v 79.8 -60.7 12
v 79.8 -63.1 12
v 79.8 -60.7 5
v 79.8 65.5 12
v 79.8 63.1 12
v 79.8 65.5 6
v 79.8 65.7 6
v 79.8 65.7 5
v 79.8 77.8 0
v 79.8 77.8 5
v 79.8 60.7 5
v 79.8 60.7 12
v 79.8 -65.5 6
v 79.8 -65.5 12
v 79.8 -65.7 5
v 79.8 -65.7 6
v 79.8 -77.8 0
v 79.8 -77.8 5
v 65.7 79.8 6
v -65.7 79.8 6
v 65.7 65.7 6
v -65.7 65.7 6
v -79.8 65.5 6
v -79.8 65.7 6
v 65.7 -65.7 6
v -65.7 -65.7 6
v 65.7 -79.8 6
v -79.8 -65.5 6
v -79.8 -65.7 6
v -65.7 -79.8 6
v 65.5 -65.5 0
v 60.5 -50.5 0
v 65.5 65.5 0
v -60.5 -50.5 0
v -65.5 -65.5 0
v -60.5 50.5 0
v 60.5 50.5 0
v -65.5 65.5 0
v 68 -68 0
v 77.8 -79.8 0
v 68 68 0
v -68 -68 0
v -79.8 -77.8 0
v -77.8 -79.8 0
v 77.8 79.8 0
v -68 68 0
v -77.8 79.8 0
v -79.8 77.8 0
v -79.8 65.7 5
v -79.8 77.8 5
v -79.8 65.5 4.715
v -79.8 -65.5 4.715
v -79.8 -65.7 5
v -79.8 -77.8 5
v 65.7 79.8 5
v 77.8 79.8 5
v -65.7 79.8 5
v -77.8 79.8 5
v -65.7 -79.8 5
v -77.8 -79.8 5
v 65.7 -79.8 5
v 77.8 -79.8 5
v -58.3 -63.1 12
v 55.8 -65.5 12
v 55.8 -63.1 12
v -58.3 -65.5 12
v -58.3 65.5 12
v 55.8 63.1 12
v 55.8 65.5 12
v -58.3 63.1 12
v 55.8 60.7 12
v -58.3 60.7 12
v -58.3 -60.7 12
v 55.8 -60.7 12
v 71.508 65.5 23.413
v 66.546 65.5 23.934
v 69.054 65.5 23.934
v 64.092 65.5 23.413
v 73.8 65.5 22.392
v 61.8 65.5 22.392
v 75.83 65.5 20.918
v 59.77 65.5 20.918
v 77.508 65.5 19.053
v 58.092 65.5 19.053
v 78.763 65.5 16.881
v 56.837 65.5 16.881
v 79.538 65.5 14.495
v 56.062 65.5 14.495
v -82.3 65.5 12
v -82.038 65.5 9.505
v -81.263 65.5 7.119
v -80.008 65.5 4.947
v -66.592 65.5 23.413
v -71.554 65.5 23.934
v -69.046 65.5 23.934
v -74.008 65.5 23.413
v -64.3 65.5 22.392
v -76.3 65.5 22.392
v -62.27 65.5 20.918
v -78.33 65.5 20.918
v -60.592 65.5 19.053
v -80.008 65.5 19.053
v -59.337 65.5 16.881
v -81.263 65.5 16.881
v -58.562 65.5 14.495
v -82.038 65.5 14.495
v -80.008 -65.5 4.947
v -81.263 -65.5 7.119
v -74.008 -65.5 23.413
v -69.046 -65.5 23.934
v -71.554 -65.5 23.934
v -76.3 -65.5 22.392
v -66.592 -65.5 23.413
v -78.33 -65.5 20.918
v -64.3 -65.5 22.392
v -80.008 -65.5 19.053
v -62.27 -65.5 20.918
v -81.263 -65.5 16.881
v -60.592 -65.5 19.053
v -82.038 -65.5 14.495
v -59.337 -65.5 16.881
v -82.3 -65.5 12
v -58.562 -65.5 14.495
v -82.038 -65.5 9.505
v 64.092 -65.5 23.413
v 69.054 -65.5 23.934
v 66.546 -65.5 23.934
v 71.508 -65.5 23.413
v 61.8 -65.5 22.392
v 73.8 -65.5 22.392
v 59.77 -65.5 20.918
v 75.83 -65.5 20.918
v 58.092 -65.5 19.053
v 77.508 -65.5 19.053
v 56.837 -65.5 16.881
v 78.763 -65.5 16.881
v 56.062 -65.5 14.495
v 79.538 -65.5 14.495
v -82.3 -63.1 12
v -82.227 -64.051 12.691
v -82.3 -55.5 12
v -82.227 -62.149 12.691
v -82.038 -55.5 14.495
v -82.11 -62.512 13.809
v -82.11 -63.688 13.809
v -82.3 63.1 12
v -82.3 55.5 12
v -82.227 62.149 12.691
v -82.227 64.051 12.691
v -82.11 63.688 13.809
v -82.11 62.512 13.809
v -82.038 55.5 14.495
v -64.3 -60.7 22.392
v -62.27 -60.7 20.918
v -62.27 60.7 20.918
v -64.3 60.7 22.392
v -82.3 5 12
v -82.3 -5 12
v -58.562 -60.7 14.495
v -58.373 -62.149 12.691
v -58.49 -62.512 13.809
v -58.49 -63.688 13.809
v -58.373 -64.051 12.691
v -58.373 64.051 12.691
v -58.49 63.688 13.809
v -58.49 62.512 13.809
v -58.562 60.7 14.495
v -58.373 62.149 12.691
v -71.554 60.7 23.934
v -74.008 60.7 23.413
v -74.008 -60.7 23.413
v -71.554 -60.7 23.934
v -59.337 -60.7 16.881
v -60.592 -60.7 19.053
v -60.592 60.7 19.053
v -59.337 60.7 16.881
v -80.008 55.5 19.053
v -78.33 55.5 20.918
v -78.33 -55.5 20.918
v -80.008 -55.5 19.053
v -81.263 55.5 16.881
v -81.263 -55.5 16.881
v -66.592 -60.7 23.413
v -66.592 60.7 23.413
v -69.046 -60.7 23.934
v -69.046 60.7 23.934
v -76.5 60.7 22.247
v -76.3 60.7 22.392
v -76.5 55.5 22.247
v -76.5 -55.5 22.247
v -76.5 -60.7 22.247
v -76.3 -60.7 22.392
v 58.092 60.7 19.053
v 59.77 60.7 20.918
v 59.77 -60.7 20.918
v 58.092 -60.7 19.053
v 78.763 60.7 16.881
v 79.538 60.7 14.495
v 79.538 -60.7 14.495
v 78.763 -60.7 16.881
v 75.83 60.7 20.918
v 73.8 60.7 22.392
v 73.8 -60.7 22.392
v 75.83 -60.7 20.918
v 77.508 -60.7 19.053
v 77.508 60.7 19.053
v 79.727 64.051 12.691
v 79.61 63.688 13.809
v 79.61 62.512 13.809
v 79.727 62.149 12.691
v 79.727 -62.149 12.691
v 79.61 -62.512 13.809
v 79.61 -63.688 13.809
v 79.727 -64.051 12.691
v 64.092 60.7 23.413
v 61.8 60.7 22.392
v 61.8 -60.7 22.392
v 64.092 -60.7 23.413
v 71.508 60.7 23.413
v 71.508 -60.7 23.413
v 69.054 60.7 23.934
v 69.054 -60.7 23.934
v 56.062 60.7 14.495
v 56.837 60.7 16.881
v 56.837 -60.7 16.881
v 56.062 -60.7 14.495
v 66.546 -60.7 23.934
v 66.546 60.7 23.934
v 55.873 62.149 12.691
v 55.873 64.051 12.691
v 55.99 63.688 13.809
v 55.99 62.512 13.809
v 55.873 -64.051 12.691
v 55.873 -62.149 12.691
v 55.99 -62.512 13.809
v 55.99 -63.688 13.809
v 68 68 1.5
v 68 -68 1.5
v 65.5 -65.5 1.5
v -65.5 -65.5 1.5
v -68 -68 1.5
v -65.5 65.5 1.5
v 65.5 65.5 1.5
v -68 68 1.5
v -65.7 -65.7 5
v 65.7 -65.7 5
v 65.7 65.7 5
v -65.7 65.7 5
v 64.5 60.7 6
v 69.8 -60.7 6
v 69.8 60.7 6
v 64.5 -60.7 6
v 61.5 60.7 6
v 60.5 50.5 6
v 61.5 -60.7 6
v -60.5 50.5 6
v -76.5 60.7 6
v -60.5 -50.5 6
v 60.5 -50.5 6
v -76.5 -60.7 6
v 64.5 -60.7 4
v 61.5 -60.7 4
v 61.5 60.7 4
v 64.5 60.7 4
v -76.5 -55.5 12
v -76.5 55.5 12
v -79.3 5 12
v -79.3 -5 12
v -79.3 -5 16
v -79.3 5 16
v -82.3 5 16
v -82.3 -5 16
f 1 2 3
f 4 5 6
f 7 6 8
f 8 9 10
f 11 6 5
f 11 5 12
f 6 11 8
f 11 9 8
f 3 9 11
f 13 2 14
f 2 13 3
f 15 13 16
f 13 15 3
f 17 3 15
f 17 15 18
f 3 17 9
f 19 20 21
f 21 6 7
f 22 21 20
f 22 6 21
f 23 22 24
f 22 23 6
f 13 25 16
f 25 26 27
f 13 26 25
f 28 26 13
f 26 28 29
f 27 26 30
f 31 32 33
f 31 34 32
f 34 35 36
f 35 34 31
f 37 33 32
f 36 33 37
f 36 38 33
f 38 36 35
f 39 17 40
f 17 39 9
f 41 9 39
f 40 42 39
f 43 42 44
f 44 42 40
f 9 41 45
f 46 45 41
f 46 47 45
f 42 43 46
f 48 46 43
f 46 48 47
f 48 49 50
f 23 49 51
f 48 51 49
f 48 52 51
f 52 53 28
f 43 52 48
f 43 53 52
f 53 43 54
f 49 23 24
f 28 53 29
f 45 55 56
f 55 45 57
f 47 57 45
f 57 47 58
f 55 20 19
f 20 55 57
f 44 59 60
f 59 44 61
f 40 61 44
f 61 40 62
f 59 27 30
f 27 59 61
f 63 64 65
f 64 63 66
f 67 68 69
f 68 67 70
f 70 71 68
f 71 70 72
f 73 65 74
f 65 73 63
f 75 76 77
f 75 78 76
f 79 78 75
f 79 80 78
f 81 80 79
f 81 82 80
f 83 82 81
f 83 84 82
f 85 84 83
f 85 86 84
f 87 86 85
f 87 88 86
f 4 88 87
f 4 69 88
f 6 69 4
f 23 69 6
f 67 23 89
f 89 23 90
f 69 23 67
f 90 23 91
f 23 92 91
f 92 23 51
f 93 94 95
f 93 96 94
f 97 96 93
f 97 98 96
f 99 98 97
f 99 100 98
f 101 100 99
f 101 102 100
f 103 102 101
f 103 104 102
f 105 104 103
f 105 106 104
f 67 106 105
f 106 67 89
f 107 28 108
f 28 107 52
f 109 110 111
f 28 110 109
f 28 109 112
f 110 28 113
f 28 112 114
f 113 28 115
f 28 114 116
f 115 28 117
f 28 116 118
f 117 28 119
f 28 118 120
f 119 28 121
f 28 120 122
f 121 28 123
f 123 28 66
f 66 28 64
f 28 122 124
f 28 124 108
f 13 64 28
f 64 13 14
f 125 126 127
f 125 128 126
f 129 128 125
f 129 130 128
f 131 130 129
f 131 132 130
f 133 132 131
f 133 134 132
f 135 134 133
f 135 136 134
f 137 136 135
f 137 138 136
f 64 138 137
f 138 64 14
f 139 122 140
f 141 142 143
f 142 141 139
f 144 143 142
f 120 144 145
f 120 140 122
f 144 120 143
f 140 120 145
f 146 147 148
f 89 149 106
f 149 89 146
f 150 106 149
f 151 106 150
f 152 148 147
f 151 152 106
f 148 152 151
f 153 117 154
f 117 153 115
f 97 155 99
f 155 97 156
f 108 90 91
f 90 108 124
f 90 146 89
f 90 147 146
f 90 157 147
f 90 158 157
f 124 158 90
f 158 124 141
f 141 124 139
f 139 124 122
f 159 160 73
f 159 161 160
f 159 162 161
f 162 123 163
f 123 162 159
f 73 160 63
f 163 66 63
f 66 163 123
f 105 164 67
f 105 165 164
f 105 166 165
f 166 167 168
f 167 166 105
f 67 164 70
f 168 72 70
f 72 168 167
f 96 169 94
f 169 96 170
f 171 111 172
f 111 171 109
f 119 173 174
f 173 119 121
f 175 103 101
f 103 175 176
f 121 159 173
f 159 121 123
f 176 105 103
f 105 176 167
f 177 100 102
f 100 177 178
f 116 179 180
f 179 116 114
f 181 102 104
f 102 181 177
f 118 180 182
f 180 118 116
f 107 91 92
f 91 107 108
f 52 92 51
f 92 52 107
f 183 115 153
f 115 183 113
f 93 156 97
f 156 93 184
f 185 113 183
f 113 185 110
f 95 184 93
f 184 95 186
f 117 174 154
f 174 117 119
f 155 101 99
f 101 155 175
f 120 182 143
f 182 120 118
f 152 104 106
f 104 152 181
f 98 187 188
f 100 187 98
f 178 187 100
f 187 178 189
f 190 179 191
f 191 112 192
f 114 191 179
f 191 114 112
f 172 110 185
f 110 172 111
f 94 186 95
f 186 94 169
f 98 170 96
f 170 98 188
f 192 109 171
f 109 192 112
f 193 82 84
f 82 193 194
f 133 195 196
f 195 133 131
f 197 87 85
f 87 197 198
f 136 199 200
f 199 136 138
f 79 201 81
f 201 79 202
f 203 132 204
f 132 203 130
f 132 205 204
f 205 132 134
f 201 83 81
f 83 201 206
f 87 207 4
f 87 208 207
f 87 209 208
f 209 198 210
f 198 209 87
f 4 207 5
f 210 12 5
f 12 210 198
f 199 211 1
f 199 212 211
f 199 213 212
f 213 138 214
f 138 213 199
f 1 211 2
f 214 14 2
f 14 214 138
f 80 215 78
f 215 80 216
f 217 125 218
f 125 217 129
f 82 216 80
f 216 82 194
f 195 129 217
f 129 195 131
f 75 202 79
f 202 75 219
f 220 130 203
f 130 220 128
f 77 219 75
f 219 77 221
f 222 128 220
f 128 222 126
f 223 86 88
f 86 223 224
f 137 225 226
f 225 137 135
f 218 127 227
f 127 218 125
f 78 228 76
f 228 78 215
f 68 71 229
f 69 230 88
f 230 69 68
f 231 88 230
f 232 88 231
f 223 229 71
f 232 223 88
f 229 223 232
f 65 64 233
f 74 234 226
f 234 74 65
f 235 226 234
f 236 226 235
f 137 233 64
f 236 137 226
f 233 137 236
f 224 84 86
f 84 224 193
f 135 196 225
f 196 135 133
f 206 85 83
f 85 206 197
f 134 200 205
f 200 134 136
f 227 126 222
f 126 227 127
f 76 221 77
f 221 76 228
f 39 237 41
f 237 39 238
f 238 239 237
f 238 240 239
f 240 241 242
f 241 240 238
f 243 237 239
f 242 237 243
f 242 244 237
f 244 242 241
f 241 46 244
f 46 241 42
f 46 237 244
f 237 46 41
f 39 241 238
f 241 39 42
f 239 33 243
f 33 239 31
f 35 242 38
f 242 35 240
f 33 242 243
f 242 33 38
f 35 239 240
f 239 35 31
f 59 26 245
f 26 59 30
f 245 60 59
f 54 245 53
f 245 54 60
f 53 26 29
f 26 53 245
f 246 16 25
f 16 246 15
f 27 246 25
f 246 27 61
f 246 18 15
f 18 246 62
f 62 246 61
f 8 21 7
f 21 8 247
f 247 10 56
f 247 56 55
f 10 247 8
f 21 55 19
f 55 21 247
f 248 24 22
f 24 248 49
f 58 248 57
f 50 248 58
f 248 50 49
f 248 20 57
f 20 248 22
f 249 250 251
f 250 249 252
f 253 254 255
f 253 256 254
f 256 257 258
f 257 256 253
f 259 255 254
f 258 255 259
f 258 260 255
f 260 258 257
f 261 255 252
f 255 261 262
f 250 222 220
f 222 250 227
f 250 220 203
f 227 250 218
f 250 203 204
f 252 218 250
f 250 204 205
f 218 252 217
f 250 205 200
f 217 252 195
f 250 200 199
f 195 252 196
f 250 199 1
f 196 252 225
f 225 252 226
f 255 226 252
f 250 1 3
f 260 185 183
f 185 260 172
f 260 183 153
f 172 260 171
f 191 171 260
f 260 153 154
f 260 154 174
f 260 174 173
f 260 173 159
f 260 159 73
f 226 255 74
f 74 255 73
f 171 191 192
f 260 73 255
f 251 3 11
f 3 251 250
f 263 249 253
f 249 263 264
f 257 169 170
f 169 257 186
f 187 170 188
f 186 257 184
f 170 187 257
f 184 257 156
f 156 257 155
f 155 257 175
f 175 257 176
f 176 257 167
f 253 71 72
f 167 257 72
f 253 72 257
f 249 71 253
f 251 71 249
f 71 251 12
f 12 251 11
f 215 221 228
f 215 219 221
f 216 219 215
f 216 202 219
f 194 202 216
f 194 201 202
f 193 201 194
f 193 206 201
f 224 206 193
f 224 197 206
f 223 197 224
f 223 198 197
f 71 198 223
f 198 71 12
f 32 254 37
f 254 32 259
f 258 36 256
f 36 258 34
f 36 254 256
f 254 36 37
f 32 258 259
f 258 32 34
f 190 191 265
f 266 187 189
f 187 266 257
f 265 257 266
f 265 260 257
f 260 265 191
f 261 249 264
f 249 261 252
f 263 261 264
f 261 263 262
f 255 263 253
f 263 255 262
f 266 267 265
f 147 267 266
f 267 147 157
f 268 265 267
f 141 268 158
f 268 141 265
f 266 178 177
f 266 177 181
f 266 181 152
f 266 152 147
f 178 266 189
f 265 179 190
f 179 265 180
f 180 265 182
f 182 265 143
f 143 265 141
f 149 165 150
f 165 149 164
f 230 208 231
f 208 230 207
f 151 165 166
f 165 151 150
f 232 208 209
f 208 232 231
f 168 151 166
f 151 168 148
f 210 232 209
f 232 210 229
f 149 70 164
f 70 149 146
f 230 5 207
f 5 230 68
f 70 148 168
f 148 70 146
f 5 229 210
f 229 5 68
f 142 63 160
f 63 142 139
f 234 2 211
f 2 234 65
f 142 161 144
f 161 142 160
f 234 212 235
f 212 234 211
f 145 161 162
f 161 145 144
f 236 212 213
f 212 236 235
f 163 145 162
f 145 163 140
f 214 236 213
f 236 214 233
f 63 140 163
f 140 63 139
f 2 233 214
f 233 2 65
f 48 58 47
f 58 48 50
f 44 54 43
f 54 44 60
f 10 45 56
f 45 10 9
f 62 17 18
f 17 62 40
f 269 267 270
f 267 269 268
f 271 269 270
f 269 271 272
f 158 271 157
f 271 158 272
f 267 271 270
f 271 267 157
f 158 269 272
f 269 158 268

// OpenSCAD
// file: config_4x5.scad
/*
This is the base configuration file for the 4x5" format
# we are not using the exact ANSI measures, but slightly rounded measures for slight simplification
*/
vStabilizerTotal_h = 7;

// general tolerance
vTolerance = 0.2;

// sheet film and cassette measurements (roughly based on the ANSI measurements)
vFilmSheet_l = 127;
vFilmSheet_w = 102;
vCassette_l = 160; // A min
vCassette_w = 121; // B max
vCassette_h = 13.2; // C max
vLightTrap_l = 2; // M2
vLightTrap_w = vCassette_w;
vLightTrap_h = 1.5; // M1
vLightTrap_offsetX = 141; // G max
vFilmWindow_l = 121;
vFilmWindow_w = 101;
vFilmWindow_offsetX = 16;
vGroundGlass_offsetZ = 5;

// Graflok
vGraflok_h = 6; // this is not the official measurement, just measured from a camera 

// lens board measures (we are using Wista/Technika-style lensboards)
vLensboard_l = 100;
vLensboard_w = 97;
vLensboard_h = 2;
vLensboard_offsetX = -(vLensboard_l+3)/2; // caution: we have an asymetric offset!
vLensboard_offsetY = -vLensboard_w/2;
vLensboardHole_d = 85;
vLensboardLighttrap_d = 89;
vLensboardLighttrap_h = 1+vTolerance;

// bellows frame measures - the bellows frame design is derived from standardcameras.com
// back frame
vBellowsBackInner_l = 144; //???? check and replace with the measurement from your bellows!
vBellowsBackInner_w = vBellowsBackInner_l;
vBellowsBackOuter_l = vBellowsBackInner_l+1;
vBellowsBackOuter_w = vBellowsBackOuter_l;

vBellowsBackFrameOuter_l = 159;
vBellowsBackFrameOuter_w = vBellowsBackFrameOuter_l;
vBellowsBackFrameOuter_h = 7;
vBellowsBackFrameInner_l = 135;
vBellowsBackFrameInner_w = vBellowsBackFrameInner_l;
vBellowsBackFrameInner_h = 5;

vBellowsBackLightTrapOuter_l = vBellowsBackFrameInner_l+2*2;
vBellowsBackLightTrapOuter_w = vBellowsBackLightTrapOuter_l;
vBellowsBackLightTrap_h = 3;

vBellowsBackFrameScrewHole_d = 2;
vBellowsBackFrameScrewHole_h = 10;
vBellowsBackFrameScrewHole_offsetXY = 70;
vBellowsBackFrameScrewHole_offsetZ = vBellowsBackFrameOuter_h/2;

// front frame
vBellowsFrontInner_l = 94; //???? check and replace with the measurement from your bellows!
vBellowsFrontInner_w = vBellowsFrontInner_l;
vBellowsFrontOuter_l = vBellowsFrontInner_l+1;
vBellowsFrontOuter_w = vBellowsFrontOuter_l;

vBellowsFrontFrameOuter_l = 104;
vBellowsFrontFrameOuter_w = vBellowsFrontFrameOuter_l;
vBellowsFrontFrameOuter_h = 7;
vBellowsFrontFrameInner_l = 82;
vBellowsFrontFrameInner_w = vBellowsFrontFrameInner_l;
vBellowsFrontFrameInner_h = 5;

vBellowsFrontLightTrapOuter_l = vBellowsFrontFrameInner_l+2*2;
vBellowsFrontLightTrapOuter_w = vBellowsFrontLightTrapOuter_l;
vBellowsFrontLightTrap_h = 0;

vBellowsFrontFrameScrewHole_d = 2;
vBellowsFrontFrameScrewHole_h = 10;
vBellowsFrontFrameScrewHole_offsetXY = 40;
vBellowsFrontFrameScrewHole_offsetZ = vBellowsFrontFrameOuter_h/2;

// body dimensions
vWall_strength = 5;
vBodyOuter_l = 185; // make sure this is at least 4*vWall_strength larger than vBellowsBackFrameOuter_l!
vBodyOuter_w = 170; // make sure this is at least 2*vWall_strength larger than vBellowsBackFrameOuter_l!
vBodyOuter_h = 65;
vBodyEdge_r = vWall_strength;

// we will center our model on the Y axis and on the center of the bellows frame
// at least for the 4x5 version, we have to do an asymetric offset of 2.5mm on the X-axis 
vAsymOffsetX = -2.5;  

// back plate
vBackPlateLength = 160; // we will probably use about the same size as the bellows back frame
vBackPlateStrength = vWall_strength;

// hinges for front lid
vHingeInnerDistance = 100;
vHingeBaseWidth = 20;
vHingeHole = 5;

// lid lock measures
vLidLockBase_d = 8;
vLidLockHole_distance = 70;

// rail dimensions
vLowerRail_w = 90;
vUpperRail_w = vLowerRail_w;

// cutout for stop indents
vStopIndent_l = 4;
vStopIndent_h = 5;
vStopIndentDistance = 25; // shorter than 25 is not necessary
vStopIndent_offsetX = 20; // don't go shorter than 20 if you intend to use a 90mm lens!

// for all dovetails we use a base width of 5mm and a base height of 5mm
// we are applying tolerances to the inner AND outer part of a dovetail, in width and height
vDoveTail_w = 5;
vDoveTail_h = 5;
vDoveTail_tolerance = 0.2;

// front standard carrier / slider
// width is depending on vUpperRail_w
vSliderBase_w = vUpperRail_w + (4*vDoveTail_w);
vSliderBase_l = 40; // make sure to have enough space in the body.


// lever plate 
vLeverPlateBase_w = vUpperRail_w - (8*vDoveTail_w);
vLeverPlateBlock_w = 25;
vLeverPlateBlock_l = vSliderBase_l-(2*vDoveTail_w);

vFrontStandard_h = 130;
vFrontStandardSlot_h = vFrontStandard_h - 30;

// lensboard carrier
vFrontPlate_length = vSliderBase_w+6; // vSliderBase_w is a bit too tight for 4x5", so there we will add 5mm, for 5x7 vSliderBase_w is OK to get a squared lensboard carrier
vFrontPlate_width = vSliderBase_w; //vFrontPlate_length;
vFrontPlate_height = 16;
vEdgeCutCylinder = floor(sqrt(2*pow(vFrontPlate_width,2)))-5;

vTiltDovetailBase_d1 = 30;
vTiltDovetailBase_d2 = vTiltDovetailBase_d1+(2*vDoveTail_w);
vTiltDovetailBaseBlock_d = vTiltDovetailBase_d1+(4*vDoveTail_w);

vTiltDovetail_d1 = vTiltDovetailBase_d1-vTolerance;
vTiltDovetail_d2 = vTiltDovetailBase_d2-vTolerance;
vTiltDovetail_h = vDoveTail_w-vTolerance;

vTiltDovetailCutout_d1 = vTiltDovetailBase_d2+vTolerance;
vTiltDovetailCutout_d2 = vTiltDovetailBase_d1+vTolerance;

vAxisHole_d = 10+vTolerance;
vAxisHole_h = vDoveTail_w+vTolerance;

vTiltLockBolt_d = 12;
vTiltLockBolt_h = 14;
vTiltLockBoltHole_d = 8;
vTiltLockBoltHole_h = vTiltLockBolt_h;

vTiltHeight = 50;
vTiltRadius = vFrontPlate_length/2;
vTiltAngleMinus = -7;
vTiltAnglePlus = 7;
vTiltAxis_d = 10-vTolerance;

// focusing rod
vFocusingRod_d = 6;
vFocusingKnob_d = 25;
vFocusingKnob_h = 20;

// stabilizer measures (just the outer measures of our stabilizer block, not the tripod slider)
vStabilizerBase_l = 135;
vStabilizerBase_w = 90;  
vStabilizerBase_h = 7;
vStabilizerDovetailBase_w = 50;
// screw holes for the stabilizer
vLidHoleCount_x = 4;
vLidHoleDist_x = 35;
vLidHoleCount_y = 2;
vLidHoleDist_y = 60;


// screw diameters, length is individually set
vScrew1Hole_d = 3;
vScrew1ThreadHole_d = 2.2;
vScrew2Hole_d = 2;
vScrew2ThreadHole_d = 1.4;


 
// file: modules.scad
/*
This is a collection of the modules which are used heavily within the whole project.
Almost all parts rely on the modules to remain "as is", especially regarding their current orientation.
So please act very carefully here, otherwise you may screw up the complete design!

*/
include <baseconfig.scad>;


// roof module - this is heavily used for dovetail cutouts
// please keep as is
module roof(l, w, h){
    polyhedron(
        points=[
            [0,0,0],
            [l,0,0],
            [l,w,0],
            [0,w,0],
            [0,w/2,h],
            [l,w/2,h]
            ],
        faces=[
            [0,1,2,3],
            [0,4,1],
            [1,4,5,2],
            [2,5,3],
            [3,5,4,0]
            ]
            );
    };

// a wedge module - this is heavily used for cutting edges
// please keep as is    
module wedge(l, w, h) {
    polyhedron(
            points=[
                [0,0,0],
                [l,0,0],
                [l,w,0],
                [0,w,0],
                [0,0,h],
                [l,0,h]
            ],
            faces=[
                [0,3,2,1],
                [0,1,5,4],
                [1,2,5],
                [2,3,4,5],
                [3,0,4]
            ]
    );
   };

// simple tube module.   
module tube(d1, d2, h) {
    difference() {
        cylinder(d=d1, h=h);
        cylinder(d=d2, h=h);
        };
    };

// mainly used for making holes for countersunk screws
// please keep as is    
module countersunk_screw(vScrew_d, vScrew_l){
    union(){
    cylinder(d=vScrew_d, h=vScrew_l);
    cylinder(d1=vScrew_d*2, d2=0, h=vScrew_d);
    };
};

// module for making hexagons, e.g. hex nuts. kw is the key width
// please keep as is
module hex(kw, h) {
	render()
        translate([0, 0, h/2])
            intersection_for(a = [0, 120, 240]) {
                rotate([0, 0, a])
                    cube([kw, 3 * kw, h], true);
                }
}


// Heatset insert
// d: Thread diameter
// od: Outer diameter
// l: Total length
module insert(d, od, l)
{
    echo(Insert = d, od, l);
    difference() {
        cylinder(l, d=od, $fn=15);
        translate([0, 0, -0.5]) cylinder(l+1, d=d, $fn=15);
        };
}

module insert_m2()
{
    color("gold") insert(2, vInsertM2Size_d, vInsertM2Depth_h);
}

module insert_m3()
{
    color("gold") insert(3, vInsertM3Size_d, vInsertM3Depth_h);
}

module insert_m5()
{
    color("gold") insert(5, vInsertM5Size_d, vInsertM5Depth_h);
}

// Countersunk screw, metric, for display
// Example: https://www.aliexpress.com/item/1005007838338973.html
module screw_cs(l, d=3, dk=6, s=2, t=1) {
    // l: total length (including head) in mm
    // d: thread diameter (eg 3 for M3)
    // dk: max head diameter
    // s: hex socket flat-to-flat size
    // t: hex socket depth
    echo(CountersunkScrew = d, l);
    difference() {
        union() {
            cylinder(h=l, r=d/2, $fn=15);
            cylinder(h=(dk-d)/2, r1=dk/2, r2=d/2, $fn=15);
            }
        cylinder(h=t, r=s/2*2/sqrt(3), $fn=6);
    }
}

module screw_m3_cs(l) {
    color("silver") screw_cs(l, d=3, dk=6, s=2, t=1);
}

module screw_m2_cs(l) {
    color("silver") screw_cs(l, d=2, dk=3.8, s=1.5, t=0.75);
}
module screw_m5_cs(l) {
    color("silver") screw_cs(l, d=5, dk=9.5, s=3, t=1.6);
}

// Button head screw, metric, for display
// Example: https://www.aliexpress.com/item/32967225441.html
module screw_bh(l, d=3, k=1.5, dk=5.5, s=2, t=1) {
    // l: shaft length (NOT including head) in mm
    // d: thread diameter (eg 3 for M3)
    // k: head depth
    // dk: head max diameter
    // s: hex socket flat-to-flat size
    // t: hex socket depth
    echo(BallheadScrew = d, l);
    difference() {
        union() {
            translate([0, 0, k]) cylinder(h=l, r=d/2, $fn=15);
            difference() {
                translate([0, 0, k]) intersection() {
                    sphere(d=dk, $fn=15);
                    translate([-dk/2, -dk/2, -dk]) cube(dk);
                }
                translate([-dk/2, -dk/2, -dk]) cube(dk);
            }
        }
        cylinder(h=t, r=s/2*2/sqrt(3), $fn=6);
    }
}

module screw_m2_bh(l) {
    color("silver") screw_bh(l, d=2, dk=3.4, s=1.175, t=0.6);
}

module screw_m3_bh(l) {
    color("silver") screw_bh(l, d=3, dk=5.7, s=2, t=1);
}


module nut_m5() {
    echo(Nut = 5);
    difference() {
        rotate([0, 0, 30]) cylinder(h=3.9, d=8*2/sqrt(3), $fn=6);
        cylinder(h=5, d=5, $fn=15);
        }
    }
    
    
module thumbscrew(bolt_d, bolt_dk, screw_d, screw_h, n_knurls, knurl_d, knurl_f) {
    // bolt_d:  central bolt diameter
    // bolt_dk: bolt head max diameter
    // screw_d: thumbscrew outer diameter
    // screw_h: thumbscrew height
    // n_knurls: number of knurls
    
    min_knurl_offset = screw_d/2 - knurl_d;
    max_knurl_offset = screw_d/2 + knurl_d;
    knurl_offset = min_knurl_offset + knurl_f*(max_knurl_offset - min_knurl_offset);
    
    difference()
    {
        union()
        {
            translate([0, 0, 1]) cylinder(screw_h-2, d=screw_d);
            cylinder(1, d1=screw_d-1, d2=screw_d);
            translate([0, 0, screw_h-1]) cylinder(1, d1=screw_d, d2=screw_d-1);
        }
        cylinder(screw_h, d=bolt_d);
        cylinder(bolt_dk/2, d1=bolt_dk, d2=0);
        for (i = [1:n_knurls])
        {
            rotate([0, 0, i*360/(n_knurls)]) translate([knurl_offset, 0, 0]) cylinder(screw_h, d=knurl_d);
        }
    }
}

module thumbscrew_m5(screw_d, screw_h, n_knurls, knurl_d, knurl_f) {
    thumbscrew(5, 9.5, screw_d, screw_h, n_knurls, knurl_d, knurl_f);
}


module t6_flange_coupler() {
    // T6 flange coupler
    // Example: https://www.aliexpress.com/item/1005008049363389.html
    echo(FlangeCoupler = 6);
    difference() {
        union() {
            translate([0, 0, 2]) cylinder(h=10, d=10);
            cylinder(h=2, d=22);
        }
        cylinder(h=12, d=6);
        translate([0, 15, 7]) rotate([90, 0, 0]) cylinder(h=30, d=3);
        for (i = [0:3]) {
            rotate([0, 0, 45+90*i]) translate([-8, 0, 0]) cylinder(h=2, d=3);
        }
    }
}


module AXK0619_thrust_bearing() {
    echo(ThrustBearing = "AXK0619");
    difference() {
        cylinder(h=4, d=19);
        cylinder(h=4, d=6);
    }
}


module t6_lead_screw(l) {
    echo(LeadScrewT6 = l);
    color("silver") cylinder(h=l, d=6);
}

module t6_lead_screw_nut() {
    echo("LeadScrewT6Nut");
    intersection()
    {
        difference() {
            union() {
                cylinder(h=15, d=12);
                translate([0, 0, 1.5]) cylinder(h=3.5, d=24);
            }
            cylinder(h=15, d=6);
        }  
        translate([-50, -12.5/2, -50]) cube([100, 12.5, 100]);
    }
}

module m5_rod(l) {
    echo(ThreadedRodM5 = l);
    color("silver") cylinder(h=l, d=5);
}


module screw_m3_grub(l) {
    echo(GrubScrew = 3, l);
    cylinder(h=l, d=3, $fn=15);
}
// file: baseconfig.scad
/*
Here we define some variables which are independent from the camera format
*/


// some generic variables

// we are including a format specific configuration sheet - but make sure to include only one!

include <config_4x5.scad>;
// include <config_5x7.scad>;
// include <config_8x10.scad>;

// Arca Swiss tripod plate
// caution: some Arca Swiss compatible tripod heads may have slight variations
// vArca_length = xx; // the length is irrelevant here
vArca_width = 38;
vArca_height = 7;
vArcaBase_cutout = 4;
vArcaBase_height = 1.5;
// main file
// loading the base configuration
include <baseconfig.scad>;

// some modules such as hex, countersunk screws, roof, wedge are available in a module file
use <modules.scad>;

module back_plate() {

vCassetteLighttrapBorder = 1.5;

vBackPlate_l = vBackPlateLength-(2*vTolerance);
vBackPlate_w = vBackPlate_l;
vBackPlate_h = vBackPlateStrength+1; // we add 1mm and make indents for our locks
vBackPlate_offsetX = -vBackPlate_l/2;
vBackPlate_offsetY = -vBackPlate_w/2;
vBackPlate_offsetZ = 0;

vEdgeCut = 2;
vEdgeCut_h = vBackPlate_h;
vEdgeCut_offsetX = -vBackPlate_l/2;
vEdgeCut_offsetY = -vBackPlate_w/2;
vEdgeCut_offsetZ = 0;

vLightTrapOuter_l = vBellowsBackFrameInner_l+1;
vLightTrapOuter_w = vLightTrapOuter_l;
vLightTrapInner_l = vLightTrapOuter_l-5;
vLightTrapInner_w = vLightTrapInner_l;
vLightTrap_h = 1.5;
vLightTrapOuter_offsetX = -vLightTrapOuter_l/2;
vLightTrapOuter_offsetY = -vLightTrapOuter_w/2;
vLightTrapInner_offsetX = -vLightTrapInner_l/2;
vLightTrapInner_offsetY = -vLightTrapInner_w/2;
vLightTrap_offsetZ = 0;

vWindowCutout_l = vFilmWindow_l;
vWindowCutout_w = vFilmWindow_w;
vWindowCutout_h = vBackPlate_h;
vWindowCutout_offsetX = -vWindowCutout_l/2;
vWindowCutout_offsetY = -vWindowCutout_w/2;
vWindowCutout_offsetZ = 0;

vCassetteBaseBlock_l = vBackPlate_l;
vCassetteBaseBlock_w = vCassette_w + (2*vWall_strength);
vCassetteBaseBlock_h = vGraflok_h; // we make this Graflok height, to make the addition of Graflok clamps a little bit easier
vCassetteBaseBlock_offsetX = -vCassetteBaseBlock_l/2;
vCassetteBaseBlock_offsetY = -vCassetteBaseBlock_w/2;
vCassetteBaseBlock_offsetZ = vBackPlate_h;

vCassetteGuideBaseCylinder_d = 24; // should be at least 2x vCassetteBaseBlock_h
vCassetteGuideBaseCylinder_h = vCassetteBaseBlock_w;
vCassetteGuideBaseCylinder_offsetX1 = -(vCassetteBaseBlock_l-vCassetteGuideBaseCylinder_d+5)/2;
vCassetteGuideBaseCylinder_offsetX2 = (vCassetteBaseBlock_l-vCassetteGuideBaseCylinder_d)/2;
vCassetteGuideBaseCylinder_offsetY = -vCassetteGuideBaseCylinder_h/2;
vCassetteGuideBaseCylinder_offsetZ = vBackPlate_h+vCassetteBaseBlock_h;

vCassetteGuideBackCutout_l = vCassetteGuideBaseCylinder_d;
vCassetteGuideBackCutout_w = vCassette_w-(2*vWall_strength);
vCassetteGuideBackCutout_h = vCassetteGuideBaseCylinder_d/2;
vCassetteGuideBackCutout_offsetX = -(vCassetteBaseBlock_l+vCassetteGuideBaseCylinder_d)/2;
vCassetteGuideBackCutout_offsetY = -vCassetteGuideBackCutout_w/2;
vCassetteGuideBackCutout_offsetZ = vBackPlate_h+vCassetteBaseBlock_h;

vCassetteCutout_l = vCassette_l;
vCassetteCutout_w = vCassette_w+(2*vTolerance); // measure your own cassettes! official maximum width is 121, but some of my older cassettes are 121.5!
vCassetteCutout_h = vCassetteGuideBaseCylinder_d; // normally we would take only the cassette height, but we need a bit more height to cut out our guides from the base cylinders
vCassetteCutout_offsetX = -((vWindowCutout_l/2)+vFilmWindow_offsetX);
vCassetteCutout_offsetY = -vCassetteCutout_w/2;
vCassetteCutout_offsetZ = vBackPlate_h;

vCassetteLighttrap_l = vLightTrap_l+1; // we take the official measure from our include and add 1mm tolerance
vCassetteLighttrap_w = vCassette_w+(2*vTolerance);
vCassetteLighttrap_h = vLightTrap_h+0.5; // we take the official measure from our include and add 0.5mm tolerance
vCassetteLighttrap_offsetX = vCassetteCutout_offsetX+vLightTrap_offsetX-vCassetteLighttrap_l;
vCassetteLighttrap_offsetY = -vCassetteLighttrap_w/2;
vCassetteLighttrap_offsetZ = vBackPlate_h-vCassetteLighttrap_h;

vSpringHole_d = 2; // we use 1.2mm spring wire, so a printed hole with 2mm should be OK
vSpringHole_h = vCassetteBaseBlock_l+vCassetteGuideBaseCylinder_d;
vSpringHole_offsetX = -vSpringHole_h/2;
vSpringHole_offsetY = ((vCassetteBaseBlock_w-vCassetteCutout_w)/4)+(vCassetteCutout_w/2);
vSpringHole_offsetZ = vBackPlate_h+vCassetteBaseBlock_h+(vSpringHole_d/2);

vSpringHolder_l = 3;
vSpringHolder_w = 10;
vSpringHolder_h = 4;
vSpringHolder_offsetX = vCassetteBaseBlock_offsetX-2.5;
vSpringHolder_offsetY = -vSpringHolder_w/2;
vSpringHolder_offsetZ = vBackPlate_h+vCassetteBaseBlock_h;

vFrontRamp_l = 10;
vFrontRamp_w = vCassetteCutout_w;
vFrontRamp_h = -(vBackPlate_h-5);
vFrontRamp_offsetX = vBackPlate_l/2;
vFrontRamp_offsetY = -vFrontRamp_w/2;
vFrontRamp_offsetZ = vBackPlate_h;

vLockPatch_l = (vBackPlate_w-vCassetteBaseBlock_w)/2-vTolerance;
vLockPatch_w = vLockPatch_l;
vLockPatch_h = vBackPlate_h-5;
vLockPatch_offsetX = -vBackPlate_l/2;
vLockPatch_offsetY = -vBackPlate_w/2;
vLockPatch_offsetZ = 5;


union(){
difference(){
    union(){
    // base plate
    translate([vBackPlate_offsetX, vBackPlate_offsetY, vBackPlate_offsetZ])
        cube([vBackPlate_l, vBackPlate_w, vBackPlate_h]);
    // cassette base block
    translate([vCassetteBaseBlock_offsetX, vCassetteBaseBlock_offsetY, vCassetteBaseBlock_offsetZ])
        cube([vCassetteBaseBlock_l, vCassetteBaseBlock_w, vCassetteBaseBlock_h]);    
    // cassette guide base cylinders
    translate([vCassetteGuideBaseCylinder_offsetX1, vCassetteGuideBaseCylinder_offsetY, vCassetteGuideBaseCylinder_offsetZ])
        rotate([270,0,0])
            cylinder(d=vCassetteGuideBaseCylinder_d, h=vCassetteGuideBaseCylinder_h);
    translate([vCassetteGuideBaseCylinder_offsetX2, vCassetteGuideBaseCylinder_offsetY, vCassetteGuideBaseCylinder_offsetZ])
        rotate([270,0,0])
            cylinder(d=vCassetteGuideBaseCylinder_d, h=vCassetteGuideBaseCylinder_h);    
        
        };
    
    // light trap
    difference(){
        translate([vLightTrapOuter_offsetX, vLightTrapOuter_offsetY, vLightTrap_offsetZ])
            cube([vLightTrapOuter_l, vLightTrapOuter_w, vLightTrap_h]);
        translate([vLightTrapInner_offsetX, vLightTrapInner_offsetY, vLightTrap_offsetZ])
            cube([vLightTrapInner_l, vLightTrapInner_w, vLightTrap_h]);
            };
    
    // front ramp
    translate([vFrontRamp_offsetX, vFrontRamp_offsetY, vFrontRamp_offsetZ])
        rotate([0, 0, 90])
            wedge(vFrontRamp_w, vFrontRamp_l, vFrontRamp_h);        
            
    // window
    translate([vWindowCutout_offsetX, vWindowCutout_offsetY, vWindowCutout_offsetZ])
        cube([vWindowCutout_l, vWindowCutout_w, vWindowCutout_h]);        
    
    // cassette cutout
    translate([vCassetteCutout_offsetX, vCassetteCutout_offsetY, vCassetteCutout_offsetZ])
        cube([vCassetteCutout_l, vCassetteCutout_w, vCassetteCutout_h]);        
            
    // cassette light trap
    translate([vCassetteLighttrap_offsetX, vCassetteLighttrap_offsetY, vCassetteLighttrap_offsetZ])
        cube([vCassetteLighttrap_l, vCassetteLighttrap_w, vCassetteLighttrap_h]);        
            
    // cassette guide back cutout
    translate([vCassetteGuideBackCutout_offsetX, vCassetteGuideBackCutout_offsetY, vCassetteGuideBackCutout_offsetZ])
        cube([vCassetteGuideBackCutout_l, vCassetteGuideBackCutout_w, vCassetteGuideBackCutout_h]);
   
    // spring holes
    // +y
    translate([vSpringHole_offsetX, vSpringHole_offsetY, vSpringHole_offsetZ])
    rotate([0, 90, 0])
    cylinder(d=vSpringHole_d, h=vSpringHole_h);
        // -y
    translate([vSpringHole_offsetX, -vSpringHole_offsetY, vSpringHole_offsetZ])
    rotate([0, 90, 0])
    cylinder(d=vSpringHole_d, h=vSpringHole_h);         
    
    // cutting the edges of the base plate
    translate([vEdgeCut_offsetX, -vEdgeCut_offsetY, vEdgeCut_offsetZ])
        rotate([0, 270, 0])
            wedge(vEdgeCut_h, -vEdgeCut, -vEdgeCut);
    translate([vEdgeCut_offsetX, vEdgeCut_offsetY, vEdgeCut_offsetZ])
        rotate([0, 270, 0])
            wedge(vEdgeCut_h, vEdgeCut, -vEdgeCut);
    translate([-vEdgeCut_offsetX, -vEdgeCut_offsetY, vEdgeCut_offsetZ])
        rotate([0, 270, 0])
            wedge(vEdgeCut_h, -vEdgeCut, vEdgeCut);
    translate([-vEdgeCut_offsetX, vEdgeCut_offsetY, vEdgeCut_offsetZ])
        rotate([0, 270, 0])
            wedge(vEdgeCut_h, vEdgeCut, vEdgeCut);
    
    // lock patches
    
    for (a =[0, 90, 180, 270]){ 
        rotate([0,0,a])
            translate([vLockPatch_offsetX, vLockPatch_offsetY, vLockPatch_offsetZ])
            cube([vLockPatch_l, vLockPatch_w, vLockPatch_h]); 
        };
    
    };
    
    // spring holder
    translate([vSpringHolder_offsetX, vSpringHolder_offsetY, vSpringHolder_offsetZ])
        cube([vSpringHolder_l, vSpringHolder_w, vSpringHolder_h]);
    
    
    
    
    
};    
 
};

back_plate();
